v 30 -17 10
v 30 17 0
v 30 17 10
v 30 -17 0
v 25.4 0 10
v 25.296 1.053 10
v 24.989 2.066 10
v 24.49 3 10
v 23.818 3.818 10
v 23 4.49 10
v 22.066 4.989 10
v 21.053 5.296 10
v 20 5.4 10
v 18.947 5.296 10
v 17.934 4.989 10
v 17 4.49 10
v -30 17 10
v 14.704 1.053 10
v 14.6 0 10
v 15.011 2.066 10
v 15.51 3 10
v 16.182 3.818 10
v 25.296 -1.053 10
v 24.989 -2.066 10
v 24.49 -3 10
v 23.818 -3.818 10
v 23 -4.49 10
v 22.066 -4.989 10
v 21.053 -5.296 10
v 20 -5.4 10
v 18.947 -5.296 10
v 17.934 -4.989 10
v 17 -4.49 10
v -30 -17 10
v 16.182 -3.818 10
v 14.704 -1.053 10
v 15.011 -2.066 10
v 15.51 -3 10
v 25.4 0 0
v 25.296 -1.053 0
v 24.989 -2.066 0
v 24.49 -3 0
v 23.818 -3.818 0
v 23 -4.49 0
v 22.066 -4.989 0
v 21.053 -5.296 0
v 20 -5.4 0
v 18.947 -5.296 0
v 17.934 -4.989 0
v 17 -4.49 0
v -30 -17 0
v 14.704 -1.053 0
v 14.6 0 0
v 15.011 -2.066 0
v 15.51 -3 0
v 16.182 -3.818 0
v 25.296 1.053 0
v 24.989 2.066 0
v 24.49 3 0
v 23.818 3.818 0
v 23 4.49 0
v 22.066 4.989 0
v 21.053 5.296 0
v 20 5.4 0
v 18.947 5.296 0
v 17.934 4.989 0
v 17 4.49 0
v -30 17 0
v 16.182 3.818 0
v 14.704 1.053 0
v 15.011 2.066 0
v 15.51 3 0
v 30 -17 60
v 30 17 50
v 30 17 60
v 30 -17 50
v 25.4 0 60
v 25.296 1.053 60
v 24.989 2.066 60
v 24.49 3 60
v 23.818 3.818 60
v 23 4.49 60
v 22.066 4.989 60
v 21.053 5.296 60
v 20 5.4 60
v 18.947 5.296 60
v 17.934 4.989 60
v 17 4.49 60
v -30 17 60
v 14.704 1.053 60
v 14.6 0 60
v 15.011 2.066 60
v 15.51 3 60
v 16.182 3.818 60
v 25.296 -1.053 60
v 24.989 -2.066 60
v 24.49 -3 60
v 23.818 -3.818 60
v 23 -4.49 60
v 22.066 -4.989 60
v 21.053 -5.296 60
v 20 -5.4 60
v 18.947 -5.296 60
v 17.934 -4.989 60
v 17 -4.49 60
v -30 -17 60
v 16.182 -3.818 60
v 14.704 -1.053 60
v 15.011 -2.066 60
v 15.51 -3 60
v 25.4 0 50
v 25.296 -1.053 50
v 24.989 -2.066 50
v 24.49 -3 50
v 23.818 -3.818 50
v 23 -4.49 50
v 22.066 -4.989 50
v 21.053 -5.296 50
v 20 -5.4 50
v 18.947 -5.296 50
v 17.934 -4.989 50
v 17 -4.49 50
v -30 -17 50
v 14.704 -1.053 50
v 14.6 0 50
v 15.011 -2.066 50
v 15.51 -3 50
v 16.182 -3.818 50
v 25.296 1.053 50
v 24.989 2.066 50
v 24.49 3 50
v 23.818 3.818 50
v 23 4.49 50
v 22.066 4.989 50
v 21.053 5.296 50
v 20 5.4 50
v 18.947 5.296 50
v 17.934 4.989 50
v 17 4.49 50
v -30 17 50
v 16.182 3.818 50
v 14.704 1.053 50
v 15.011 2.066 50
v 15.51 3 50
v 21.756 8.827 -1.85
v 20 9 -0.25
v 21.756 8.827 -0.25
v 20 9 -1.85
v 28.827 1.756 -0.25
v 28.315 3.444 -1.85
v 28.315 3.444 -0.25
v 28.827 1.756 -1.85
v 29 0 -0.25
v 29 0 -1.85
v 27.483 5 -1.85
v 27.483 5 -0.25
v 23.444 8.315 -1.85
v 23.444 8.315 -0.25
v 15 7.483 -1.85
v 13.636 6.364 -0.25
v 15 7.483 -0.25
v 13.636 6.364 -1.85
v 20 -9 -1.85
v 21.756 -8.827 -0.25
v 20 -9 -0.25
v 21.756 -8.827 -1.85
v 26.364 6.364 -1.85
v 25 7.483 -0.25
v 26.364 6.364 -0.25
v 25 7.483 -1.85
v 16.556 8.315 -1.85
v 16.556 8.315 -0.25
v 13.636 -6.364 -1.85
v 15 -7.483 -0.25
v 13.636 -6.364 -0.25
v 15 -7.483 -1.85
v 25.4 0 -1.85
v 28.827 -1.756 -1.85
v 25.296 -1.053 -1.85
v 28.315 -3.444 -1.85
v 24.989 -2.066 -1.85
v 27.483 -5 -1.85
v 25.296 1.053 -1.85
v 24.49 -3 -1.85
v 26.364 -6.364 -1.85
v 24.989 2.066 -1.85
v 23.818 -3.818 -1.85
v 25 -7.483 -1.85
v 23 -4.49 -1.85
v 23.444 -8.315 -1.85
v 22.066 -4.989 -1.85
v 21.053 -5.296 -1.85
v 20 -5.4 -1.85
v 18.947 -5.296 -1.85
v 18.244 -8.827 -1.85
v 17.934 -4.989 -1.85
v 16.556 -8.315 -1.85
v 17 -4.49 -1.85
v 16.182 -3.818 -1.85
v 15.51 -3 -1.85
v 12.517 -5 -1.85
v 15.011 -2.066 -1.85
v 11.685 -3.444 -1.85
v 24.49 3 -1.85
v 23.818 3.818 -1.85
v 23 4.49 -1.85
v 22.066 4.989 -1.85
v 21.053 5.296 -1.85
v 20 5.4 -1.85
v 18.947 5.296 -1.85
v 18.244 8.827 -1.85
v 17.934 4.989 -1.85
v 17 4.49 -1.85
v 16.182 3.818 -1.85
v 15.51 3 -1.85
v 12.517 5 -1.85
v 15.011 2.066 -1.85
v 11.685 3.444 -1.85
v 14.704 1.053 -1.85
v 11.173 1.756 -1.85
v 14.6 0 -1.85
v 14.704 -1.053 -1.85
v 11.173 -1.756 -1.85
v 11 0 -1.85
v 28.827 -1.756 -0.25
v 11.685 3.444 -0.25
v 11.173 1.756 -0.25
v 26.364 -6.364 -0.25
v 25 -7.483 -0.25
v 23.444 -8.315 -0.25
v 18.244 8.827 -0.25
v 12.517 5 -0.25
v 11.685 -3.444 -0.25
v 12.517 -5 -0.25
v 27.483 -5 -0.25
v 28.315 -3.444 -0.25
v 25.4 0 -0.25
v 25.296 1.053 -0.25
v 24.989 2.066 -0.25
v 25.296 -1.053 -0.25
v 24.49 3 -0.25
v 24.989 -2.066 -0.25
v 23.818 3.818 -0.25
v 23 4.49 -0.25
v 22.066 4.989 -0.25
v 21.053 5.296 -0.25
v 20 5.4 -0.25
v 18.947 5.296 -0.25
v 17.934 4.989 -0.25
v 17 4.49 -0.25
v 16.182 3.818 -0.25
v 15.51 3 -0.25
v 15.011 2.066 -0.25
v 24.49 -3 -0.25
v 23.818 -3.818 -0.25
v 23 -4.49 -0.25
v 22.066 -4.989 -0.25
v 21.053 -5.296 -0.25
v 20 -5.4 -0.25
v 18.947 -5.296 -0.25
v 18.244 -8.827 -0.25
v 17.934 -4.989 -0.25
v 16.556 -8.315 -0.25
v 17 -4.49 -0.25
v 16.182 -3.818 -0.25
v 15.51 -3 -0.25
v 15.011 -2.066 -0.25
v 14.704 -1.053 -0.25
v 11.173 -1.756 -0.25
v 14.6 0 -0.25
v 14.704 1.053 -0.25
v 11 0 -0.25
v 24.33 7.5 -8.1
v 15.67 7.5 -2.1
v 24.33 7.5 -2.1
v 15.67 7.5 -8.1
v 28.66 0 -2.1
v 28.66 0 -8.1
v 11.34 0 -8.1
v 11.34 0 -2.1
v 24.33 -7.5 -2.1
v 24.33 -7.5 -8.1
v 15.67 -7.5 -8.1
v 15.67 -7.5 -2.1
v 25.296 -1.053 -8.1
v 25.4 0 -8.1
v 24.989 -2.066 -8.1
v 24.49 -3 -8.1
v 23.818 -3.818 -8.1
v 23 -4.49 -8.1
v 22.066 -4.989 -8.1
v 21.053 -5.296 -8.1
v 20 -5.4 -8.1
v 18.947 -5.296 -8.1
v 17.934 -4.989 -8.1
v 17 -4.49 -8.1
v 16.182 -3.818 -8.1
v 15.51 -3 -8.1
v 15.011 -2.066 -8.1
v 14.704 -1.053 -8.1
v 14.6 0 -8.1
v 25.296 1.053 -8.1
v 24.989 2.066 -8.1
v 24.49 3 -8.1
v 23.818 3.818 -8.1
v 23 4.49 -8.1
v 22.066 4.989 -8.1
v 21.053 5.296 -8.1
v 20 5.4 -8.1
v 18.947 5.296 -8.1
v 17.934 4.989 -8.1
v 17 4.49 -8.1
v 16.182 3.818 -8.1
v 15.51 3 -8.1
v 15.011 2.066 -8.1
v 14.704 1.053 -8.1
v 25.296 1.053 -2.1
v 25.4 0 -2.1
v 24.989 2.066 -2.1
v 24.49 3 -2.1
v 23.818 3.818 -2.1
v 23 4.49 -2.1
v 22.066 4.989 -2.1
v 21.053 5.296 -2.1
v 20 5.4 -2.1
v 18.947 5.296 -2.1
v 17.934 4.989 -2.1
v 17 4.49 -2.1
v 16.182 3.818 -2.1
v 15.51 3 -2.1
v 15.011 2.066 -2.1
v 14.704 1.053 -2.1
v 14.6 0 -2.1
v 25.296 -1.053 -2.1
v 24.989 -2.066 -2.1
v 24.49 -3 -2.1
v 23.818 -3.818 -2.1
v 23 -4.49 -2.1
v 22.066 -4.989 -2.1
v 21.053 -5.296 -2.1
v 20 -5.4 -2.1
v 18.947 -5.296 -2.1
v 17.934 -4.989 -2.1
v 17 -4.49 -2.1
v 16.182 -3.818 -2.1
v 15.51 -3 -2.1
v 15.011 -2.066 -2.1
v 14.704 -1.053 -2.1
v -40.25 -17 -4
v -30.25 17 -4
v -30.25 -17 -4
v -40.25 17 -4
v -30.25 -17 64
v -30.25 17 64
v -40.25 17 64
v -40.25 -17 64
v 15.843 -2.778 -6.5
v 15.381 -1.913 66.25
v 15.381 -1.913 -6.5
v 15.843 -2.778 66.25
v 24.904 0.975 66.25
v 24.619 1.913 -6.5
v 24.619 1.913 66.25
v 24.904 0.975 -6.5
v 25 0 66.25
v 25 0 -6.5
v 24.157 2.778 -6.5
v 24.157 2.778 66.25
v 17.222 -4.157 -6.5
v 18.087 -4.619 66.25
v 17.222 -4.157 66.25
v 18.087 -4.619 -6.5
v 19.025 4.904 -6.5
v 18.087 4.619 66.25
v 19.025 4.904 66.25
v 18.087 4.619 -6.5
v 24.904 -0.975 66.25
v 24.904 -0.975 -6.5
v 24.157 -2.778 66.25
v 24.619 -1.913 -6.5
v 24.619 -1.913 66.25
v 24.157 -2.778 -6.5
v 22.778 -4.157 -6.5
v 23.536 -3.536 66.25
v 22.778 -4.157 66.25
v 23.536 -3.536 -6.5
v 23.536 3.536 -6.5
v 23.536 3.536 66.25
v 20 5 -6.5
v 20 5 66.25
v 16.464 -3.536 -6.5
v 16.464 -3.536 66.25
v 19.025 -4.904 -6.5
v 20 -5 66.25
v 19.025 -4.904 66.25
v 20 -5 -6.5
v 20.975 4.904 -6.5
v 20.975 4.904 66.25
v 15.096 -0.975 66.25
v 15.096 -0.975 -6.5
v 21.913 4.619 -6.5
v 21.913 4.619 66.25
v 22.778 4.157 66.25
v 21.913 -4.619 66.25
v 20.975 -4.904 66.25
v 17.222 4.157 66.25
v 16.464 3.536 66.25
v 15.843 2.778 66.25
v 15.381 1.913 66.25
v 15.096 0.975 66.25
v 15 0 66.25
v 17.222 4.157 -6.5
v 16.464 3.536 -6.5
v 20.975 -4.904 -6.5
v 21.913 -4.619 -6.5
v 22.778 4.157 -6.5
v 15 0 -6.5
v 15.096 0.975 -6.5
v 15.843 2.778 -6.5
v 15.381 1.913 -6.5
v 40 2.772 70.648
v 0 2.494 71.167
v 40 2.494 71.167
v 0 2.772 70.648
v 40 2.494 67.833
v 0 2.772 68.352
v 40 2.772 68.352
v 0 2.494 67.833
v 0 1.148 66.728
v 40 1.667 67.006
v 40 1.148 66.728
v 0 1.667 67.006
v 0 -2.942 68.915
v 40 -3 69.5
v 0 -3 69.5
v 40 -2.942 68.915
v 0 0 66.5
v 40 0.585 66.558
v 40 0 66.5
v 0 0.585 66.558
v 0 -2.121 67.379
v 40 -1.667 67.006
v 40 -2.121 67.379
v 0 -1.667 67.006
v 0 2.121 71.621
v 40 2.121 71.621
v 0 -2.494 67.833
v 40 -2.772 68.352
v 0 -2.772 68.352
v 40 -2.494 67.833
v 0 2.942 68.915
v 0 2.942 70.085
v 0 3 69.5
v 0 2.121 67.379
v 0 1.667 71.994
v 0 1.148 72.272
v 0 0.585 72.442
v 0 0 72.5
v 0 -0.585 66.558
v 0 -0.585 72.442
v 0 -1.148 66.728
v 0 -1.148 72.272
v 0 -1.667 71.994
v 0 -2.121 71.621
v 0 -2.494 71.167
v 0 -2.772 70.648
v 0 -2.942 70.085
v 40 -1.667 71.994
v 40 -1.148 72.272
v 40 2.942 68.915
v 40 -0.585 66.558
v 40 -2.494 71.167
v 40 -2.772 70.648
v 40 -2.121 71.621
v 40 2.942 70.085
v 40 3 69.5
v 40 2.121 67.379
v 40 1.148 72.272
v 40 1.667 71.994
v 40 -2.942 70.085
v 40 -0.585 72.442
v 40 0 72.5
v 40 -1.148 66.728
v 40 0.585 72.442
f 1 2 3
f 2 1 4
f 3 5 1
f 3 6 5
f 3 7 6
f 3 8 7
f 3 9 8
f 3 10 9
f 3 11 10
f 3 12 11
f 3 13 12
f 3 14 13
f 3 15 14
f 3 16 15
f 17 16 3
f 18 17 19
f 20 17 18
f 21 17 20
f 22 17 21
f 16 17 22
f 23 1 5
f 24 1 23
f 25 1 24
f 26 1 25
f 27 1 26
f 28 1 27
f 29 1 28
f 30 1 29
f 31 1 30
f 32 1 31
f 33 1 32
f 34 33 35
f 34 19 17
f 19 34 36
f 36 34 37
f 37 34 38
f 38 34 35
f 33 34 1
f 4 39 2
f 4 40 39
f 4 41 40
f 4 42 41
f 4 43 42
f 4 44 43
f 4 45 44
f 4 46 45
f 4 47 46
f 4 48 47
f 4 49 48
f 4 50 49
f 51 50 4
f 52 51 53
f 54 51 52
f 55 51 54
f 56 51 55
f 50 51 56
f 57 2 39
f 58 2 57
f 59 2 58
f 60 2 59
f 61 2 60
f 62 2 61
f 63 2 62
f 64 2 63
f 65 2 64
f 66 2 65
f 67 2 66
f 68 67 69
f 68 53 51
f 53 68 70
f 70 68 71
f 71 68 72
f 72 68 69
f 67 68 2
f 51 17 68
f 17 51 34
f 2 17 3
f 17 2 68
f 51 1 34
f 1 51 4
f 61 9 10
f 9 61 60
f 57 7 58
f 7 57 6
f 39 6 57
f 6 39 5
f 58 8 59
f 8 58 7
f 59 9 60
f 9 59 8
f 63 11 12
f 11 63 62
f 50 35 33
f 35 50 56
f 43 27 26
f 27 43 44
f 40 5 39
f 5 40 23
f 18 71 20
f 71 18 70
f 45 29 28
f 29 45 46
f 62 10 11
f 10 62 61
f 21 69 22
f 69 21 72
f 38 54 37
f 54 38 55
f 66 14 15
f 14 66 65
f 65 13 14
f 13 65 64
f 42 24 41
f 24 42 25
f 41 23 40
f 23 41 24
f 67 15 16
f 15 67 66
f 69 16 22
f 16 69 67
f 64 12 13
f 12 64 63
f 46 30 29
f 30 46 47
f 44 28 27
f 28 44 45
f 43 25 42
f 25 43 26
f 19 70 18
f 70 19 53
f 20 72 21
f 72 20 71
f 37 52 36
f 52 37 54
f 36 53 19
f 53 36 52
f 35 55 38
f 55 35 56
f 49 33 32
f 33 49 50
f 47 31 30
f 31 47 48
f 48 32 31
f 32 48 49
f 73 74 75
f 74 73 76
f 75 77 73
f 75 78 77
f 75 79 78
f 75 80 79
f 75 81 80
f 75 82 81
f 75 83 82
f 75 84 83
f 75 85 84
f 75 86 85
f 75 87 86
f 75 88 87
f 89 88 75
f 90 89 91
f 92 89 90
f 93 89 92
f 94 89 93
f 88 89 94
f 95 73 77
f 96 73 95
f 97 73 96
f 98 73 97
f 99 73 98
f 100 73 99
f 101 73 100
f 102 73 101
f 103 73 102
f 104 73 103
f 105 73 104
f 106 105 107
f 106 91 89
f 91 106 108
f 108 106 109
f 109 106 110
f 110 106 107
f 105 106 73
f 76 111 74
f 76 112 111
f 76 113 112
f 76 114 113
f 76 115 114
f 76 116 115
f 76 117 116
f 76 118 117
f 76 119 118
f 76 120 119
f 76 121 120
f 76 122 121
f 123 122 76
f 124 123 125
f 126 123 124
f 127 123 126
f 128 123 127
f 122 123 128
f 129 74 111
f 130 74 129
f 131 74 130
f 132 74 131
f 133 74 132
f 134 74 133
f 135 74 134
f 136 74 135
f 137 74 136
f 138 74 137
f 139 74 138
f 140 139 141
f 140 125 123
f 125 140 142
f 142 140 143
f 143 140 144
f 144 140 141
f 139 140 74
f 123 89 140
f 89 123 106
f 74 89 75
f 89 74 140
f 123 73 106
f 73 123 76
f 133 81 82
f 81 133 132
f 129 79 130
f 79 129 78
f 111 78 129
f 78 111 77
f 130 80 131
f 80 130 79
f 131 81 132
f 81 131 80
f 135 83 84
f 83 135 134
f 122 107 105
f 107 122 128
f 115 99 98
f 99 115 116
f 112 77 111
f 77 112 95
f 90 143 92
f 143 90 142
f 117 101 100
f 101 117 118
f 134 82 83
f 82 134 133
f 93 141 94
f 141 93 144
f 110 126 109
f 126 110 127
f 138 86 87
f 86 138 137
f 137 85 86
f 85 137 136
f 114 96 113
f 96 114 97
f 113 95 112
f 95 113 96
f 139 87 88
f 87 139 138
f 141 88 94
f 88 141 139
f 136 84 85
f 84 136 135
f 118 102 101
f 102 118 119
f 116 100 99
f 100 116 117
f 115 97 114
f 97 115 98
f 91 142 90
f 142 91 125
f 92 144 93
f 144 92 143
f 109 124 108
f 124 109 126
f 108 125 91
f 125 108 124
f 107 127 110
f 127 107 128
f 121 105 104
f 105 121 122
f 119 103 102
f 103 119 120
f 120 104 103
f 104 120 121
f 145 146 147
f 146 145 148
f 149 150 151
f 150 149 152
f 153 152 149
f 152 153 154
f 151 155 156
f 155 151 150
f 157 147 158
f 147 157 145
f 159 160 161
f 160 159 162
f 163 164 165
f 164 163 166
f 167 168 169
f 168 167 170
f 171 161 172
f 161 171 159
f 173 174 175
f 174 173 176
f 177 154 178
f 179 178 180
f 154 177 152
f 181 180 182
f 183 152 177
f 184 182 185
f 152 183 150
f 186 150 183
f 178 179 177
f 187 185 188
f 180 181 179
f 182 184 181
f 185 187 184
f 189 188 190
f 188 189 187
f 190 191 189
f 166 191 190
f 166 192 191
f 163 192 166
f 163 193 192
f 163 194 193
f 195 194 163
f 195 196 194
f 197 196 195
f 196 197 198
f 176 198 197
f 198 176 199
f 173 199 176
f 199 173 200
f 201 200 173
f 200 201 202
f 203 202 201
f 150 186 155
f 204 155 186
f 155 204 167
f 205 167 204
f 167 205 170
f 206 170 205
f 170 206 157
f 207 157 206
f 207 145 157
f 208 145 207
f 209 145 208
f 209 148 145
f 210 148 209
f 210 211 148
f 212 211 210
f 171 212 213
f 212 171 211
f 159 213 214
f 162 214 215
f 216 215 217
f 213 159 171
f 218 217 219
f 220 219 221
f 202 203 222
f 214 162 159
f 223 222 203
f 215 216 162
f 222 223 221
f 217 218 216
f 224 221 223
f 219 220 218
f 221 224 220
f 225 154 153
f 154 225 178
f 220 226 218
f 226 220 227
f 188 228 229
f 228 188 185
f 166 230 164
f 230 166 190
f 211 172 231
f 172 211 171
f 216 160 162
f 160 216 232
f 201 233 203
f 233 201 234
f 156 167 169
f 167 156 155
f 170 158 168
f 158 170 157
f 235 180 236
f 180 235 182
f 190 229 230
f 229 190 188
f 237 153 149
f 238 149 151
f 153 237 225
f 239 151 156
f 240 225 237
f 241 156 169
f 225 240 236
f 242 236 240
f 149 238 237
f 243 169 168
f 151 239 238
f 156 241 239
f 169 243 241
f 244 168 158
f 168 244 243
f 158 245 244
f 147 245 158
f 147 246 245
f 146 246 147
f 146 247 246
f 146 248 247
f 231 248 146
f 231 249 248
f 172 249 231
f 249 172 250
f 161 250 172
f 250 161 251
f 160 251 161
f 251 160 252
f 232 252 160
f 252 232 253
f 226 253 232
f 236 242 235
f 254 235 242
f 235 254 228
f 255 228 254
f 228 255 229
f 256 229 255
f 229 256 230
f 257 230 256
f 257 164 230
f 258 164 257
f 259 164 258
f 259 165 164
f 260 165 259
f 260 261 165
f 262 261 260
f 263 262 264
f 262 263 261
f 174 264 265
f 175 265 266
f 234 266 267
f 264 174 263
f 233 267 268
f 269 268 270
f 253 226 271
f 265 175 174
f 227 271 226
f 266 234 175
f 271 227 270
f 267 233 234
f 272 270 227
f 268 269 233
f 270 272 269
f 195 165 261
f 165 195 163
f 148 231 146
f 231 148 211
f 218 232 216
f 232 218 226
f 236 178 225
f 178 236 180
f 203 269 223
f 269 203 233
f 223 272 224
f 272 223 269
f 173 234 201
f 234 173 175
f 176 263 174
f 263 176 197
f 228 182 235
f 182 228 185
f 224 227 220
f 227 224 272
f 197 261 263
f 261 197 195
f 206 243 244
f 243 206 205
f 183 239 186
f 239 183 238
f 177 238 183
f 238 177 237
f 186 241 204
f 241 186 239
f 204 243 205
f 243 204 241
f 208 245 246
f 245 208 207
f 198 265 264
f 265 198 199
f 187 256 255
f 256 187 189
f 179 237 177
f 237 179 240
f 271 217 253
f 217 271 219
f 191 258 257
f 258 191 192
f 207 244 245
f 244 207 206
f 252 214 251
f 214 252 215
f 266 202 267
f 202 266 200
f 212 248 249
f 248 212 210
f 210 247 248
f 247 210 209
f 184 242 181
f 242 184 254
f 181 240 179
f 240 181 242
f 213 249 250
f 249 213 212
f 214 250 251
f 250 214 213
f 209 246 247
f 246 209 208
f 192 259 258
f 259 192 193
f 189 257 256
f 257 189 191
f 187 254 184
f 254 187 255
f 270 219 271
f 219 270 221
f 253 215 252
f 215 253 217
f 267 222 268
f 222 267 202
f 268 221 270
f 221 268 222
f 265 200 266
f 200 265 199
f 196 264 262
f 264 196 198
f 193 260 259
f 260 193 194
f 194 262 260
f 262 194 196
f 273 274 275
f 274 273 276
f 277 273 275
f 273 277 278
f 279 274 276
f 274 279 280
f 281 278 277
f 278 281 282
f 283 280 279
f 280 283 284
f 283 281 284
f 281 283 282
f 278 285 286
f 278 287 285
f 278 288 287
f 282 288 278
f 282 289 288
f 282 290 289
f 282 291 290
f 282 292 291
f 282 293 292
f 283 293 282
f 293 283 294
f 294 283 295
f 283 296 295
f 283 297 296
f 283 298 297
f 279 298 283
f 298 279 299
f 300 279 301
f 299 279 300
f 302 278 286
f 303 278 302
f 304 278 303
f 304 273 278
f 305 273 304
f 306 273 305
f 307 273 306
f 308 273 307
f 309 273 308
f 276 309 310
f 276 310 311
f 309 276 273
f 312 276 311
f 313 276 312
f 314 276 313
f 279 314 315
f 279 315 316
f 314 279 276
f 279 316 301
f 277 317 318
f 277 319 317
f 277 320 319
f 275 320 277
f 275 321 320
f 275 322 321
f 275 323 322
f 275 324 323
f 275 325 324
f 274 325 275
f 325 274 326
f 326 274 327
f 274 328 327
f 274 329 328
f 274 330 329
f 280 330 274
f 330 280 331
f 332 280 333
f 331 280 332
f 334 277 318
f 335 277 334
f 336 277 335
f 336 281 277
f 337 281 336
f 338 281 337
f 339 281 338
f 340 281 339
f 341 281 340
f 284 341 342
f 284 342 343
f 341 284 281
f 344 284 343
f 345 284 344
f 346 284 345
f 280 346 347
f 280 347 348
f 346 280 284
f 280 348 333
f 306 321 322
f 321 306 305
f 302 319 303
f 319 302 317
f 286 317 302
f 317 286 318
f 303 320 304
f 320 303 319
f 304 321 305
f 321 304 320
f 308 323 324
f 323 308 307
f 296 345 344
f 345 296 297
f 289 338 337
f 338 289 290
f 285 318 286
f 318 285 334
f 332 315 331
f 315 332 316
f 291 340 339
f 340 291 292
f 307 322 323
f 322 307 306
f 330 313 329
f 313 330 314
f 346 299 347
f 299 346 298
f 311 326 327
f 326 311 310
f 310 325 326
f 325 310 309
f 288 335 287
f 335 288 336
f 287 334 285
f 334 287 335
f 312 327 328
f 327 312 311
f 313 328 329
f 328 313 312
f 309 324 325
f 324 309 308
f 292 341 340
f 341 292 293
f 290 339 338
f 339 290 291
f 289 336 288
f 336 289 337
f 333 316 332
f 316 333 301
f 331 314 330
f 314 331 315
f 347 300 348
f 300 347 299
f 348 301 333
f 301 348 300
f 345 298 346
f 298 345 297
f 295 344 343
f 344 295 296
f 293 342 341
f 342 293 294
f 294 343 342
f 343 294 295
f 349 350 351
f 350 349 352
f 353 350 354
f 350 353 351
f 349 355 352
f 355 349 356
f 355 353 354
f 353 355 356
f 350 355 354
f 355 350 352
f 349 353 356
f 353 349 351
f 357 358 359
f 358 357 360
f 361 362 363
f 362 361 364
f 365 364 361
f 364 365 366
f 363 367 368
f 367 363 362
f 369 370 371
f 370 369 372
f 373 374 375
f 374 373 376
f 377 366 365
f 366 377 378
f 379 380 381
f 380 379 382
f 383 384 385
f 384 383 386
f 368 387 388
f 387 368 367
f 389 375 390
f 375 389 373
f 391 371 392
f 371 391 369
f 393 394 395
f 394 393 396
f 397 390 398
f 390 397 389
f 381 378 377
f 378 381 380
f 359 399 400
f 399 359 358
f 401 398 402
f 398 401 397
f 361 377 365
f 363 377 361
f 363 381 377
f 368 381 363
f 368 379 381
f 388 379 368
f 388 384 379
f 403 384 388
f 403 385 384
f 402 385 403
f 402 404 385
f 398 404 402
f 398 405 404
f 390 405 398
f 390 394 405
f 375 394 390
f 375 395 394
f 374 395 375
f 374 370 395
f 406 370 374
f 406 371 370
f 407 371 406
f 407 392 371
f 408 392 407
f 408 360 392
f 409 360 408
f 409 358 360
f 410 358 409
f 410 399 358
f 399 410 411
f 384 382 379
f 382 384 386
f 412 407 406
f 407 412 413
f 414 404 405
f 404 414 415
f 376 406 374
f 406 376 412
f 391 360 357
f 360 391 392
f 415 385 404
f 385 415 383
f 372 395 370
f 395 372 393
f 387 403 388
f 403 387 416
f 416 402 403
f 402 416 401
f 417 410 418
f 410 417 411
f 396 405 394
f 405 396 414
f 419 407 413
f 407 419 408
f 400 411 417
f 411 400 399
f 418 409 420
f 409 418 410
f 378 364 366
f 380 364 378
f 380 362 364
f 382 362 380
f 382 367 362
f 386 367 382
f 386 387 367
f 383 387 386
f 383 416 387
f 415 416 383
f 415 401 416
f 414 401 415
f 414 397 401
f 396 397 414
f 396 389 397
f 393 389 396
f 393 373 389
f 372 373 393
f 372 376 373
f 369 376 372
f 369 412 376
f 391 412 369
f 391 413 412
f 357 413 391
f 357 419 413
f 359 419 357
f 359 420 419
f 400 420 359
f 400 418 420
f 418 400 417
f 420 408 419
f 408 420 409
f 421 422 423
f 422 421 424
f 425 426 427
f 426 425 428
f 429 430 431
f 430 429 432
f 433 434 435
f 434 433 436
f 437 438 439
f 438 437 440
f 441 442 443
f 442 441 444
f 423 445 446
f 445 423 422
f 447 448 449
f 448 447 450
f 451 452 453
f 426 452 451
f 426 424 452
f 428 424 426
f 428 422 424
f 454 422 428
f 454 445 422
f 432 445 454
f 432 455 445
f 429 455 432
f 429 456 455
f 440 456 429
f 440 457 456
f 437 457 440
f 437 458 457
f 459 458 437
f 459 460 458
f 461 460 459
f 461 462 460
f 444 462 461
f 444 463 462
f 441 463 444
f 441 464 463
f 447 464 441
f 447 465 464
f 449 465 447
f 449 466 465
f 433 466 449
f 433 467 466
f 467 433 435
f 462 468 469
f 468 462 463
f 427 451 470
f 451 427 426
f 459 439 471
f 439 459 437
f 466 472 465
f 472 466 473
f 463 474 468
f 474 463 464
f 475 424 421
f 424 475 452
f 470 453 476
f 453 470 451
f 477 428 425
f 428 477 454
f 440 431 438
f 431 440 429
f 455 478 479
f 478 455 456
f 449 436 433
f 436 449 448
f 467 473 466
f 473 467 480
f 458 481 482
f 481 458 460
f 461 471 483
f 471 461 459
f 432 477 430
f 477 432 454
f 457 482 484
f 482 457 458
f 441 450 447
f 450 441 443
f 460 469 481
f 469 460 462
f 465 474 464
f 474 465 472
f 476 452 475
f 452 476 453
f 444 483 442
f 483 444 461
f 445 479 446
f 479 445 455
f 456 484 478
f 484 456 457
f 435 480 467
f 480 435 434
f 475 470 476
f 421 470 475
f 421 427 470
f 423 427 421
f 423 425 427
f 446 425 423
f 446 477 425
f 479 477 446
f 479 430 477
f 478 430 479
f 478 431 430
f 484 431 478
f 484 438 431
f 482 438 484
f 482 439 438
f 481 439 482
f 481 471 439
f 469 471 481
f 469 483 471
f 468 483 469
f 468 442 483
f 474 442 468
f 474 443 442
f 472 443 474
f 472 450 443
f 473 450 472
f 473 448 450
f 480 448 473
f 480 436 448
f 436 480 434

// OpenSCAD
$fn = 32;

// ------------------------------------------------------------------------
// C clamp: throat 50 mm, screw d10
// Every part is its own module, assembly() places every instance.
// ------------------------------------------------------------------------

// --- part 1 ---
module clamp_arm() {
  difference() {
    translate([-30, -17, 0]) cube([60, 34, 10]);
    translate([20, 0, -1]) cylinder(h = 12, d = 10.8);
  }
}

// --- part 2 ---
module clamp_spine() {
  difference() {
    translate([-34, -17, 0]) cube([68, 34, 10]);
  }
}

// --- part 3 ---
module clamp_screw() {
  translate([0, 0, -36.375]) cylinder(h = 72.75, d = 10);
}

// --- part 4 ---
module clamp_washer() {
  difference() {
      translate([0, 0, 0]) cylinder(h = 1.6, d = 18);
      translate([0, 0, -1]) cylinder(h = 3.6, d = 10.8);
    }
}

// --- part 5 ---
module clamp_nut() {
  difference() {
    linear_extrude(height = 6) polygon(points = [[8.66, 0], [4.33, 7.5], [-4.33, 7.5], [-8.66, 0], [-4.33, -7.5], [4.33, -7.5]]);
    translate([0, 0, -1]) cylinder(h = 8, d = 10.8);
  }
}

// --- part 6 ---
module tommy_bar() {
  translate([0, 0, -20]) cylinder(h = 40, d = 6);
}

// --- assembly ---
module assembly() {
  color([0.80, 0.24, 0.20]) translate([0, 0, 0]) rotate([0, 0, 0]) clamp_arm();
  color([0.20, 0.45, 0.75]) translate([0, 0, 50]) rotate([0, 0, 0]) clamp_arm();
  color([0.25, 0.62, 0.32]) translate([-40.25, 0, 30]) rotate([0, 90, 0]) clamp_spine();
  color([0.92, 0.70, 0.18]) translate([20, 0, 29.875]) rotate([0, 0, 0]) clamp_screw();
  color([0.58, 0.35, 0.70]) translate([20, 0, -1.85]) rotate([0, 0, 0]) clamp_washer();
  color([0.16, 0.66, 0.66]) translate([20, 0, -8.1]) rotate([0, 0, 0]) clamp_nut();
  color([0.85, 0.48, 0.18]) translate([20, 0, 69.5]) rotate([0, 90, 0]) tommy_bar();
}

assembly();
